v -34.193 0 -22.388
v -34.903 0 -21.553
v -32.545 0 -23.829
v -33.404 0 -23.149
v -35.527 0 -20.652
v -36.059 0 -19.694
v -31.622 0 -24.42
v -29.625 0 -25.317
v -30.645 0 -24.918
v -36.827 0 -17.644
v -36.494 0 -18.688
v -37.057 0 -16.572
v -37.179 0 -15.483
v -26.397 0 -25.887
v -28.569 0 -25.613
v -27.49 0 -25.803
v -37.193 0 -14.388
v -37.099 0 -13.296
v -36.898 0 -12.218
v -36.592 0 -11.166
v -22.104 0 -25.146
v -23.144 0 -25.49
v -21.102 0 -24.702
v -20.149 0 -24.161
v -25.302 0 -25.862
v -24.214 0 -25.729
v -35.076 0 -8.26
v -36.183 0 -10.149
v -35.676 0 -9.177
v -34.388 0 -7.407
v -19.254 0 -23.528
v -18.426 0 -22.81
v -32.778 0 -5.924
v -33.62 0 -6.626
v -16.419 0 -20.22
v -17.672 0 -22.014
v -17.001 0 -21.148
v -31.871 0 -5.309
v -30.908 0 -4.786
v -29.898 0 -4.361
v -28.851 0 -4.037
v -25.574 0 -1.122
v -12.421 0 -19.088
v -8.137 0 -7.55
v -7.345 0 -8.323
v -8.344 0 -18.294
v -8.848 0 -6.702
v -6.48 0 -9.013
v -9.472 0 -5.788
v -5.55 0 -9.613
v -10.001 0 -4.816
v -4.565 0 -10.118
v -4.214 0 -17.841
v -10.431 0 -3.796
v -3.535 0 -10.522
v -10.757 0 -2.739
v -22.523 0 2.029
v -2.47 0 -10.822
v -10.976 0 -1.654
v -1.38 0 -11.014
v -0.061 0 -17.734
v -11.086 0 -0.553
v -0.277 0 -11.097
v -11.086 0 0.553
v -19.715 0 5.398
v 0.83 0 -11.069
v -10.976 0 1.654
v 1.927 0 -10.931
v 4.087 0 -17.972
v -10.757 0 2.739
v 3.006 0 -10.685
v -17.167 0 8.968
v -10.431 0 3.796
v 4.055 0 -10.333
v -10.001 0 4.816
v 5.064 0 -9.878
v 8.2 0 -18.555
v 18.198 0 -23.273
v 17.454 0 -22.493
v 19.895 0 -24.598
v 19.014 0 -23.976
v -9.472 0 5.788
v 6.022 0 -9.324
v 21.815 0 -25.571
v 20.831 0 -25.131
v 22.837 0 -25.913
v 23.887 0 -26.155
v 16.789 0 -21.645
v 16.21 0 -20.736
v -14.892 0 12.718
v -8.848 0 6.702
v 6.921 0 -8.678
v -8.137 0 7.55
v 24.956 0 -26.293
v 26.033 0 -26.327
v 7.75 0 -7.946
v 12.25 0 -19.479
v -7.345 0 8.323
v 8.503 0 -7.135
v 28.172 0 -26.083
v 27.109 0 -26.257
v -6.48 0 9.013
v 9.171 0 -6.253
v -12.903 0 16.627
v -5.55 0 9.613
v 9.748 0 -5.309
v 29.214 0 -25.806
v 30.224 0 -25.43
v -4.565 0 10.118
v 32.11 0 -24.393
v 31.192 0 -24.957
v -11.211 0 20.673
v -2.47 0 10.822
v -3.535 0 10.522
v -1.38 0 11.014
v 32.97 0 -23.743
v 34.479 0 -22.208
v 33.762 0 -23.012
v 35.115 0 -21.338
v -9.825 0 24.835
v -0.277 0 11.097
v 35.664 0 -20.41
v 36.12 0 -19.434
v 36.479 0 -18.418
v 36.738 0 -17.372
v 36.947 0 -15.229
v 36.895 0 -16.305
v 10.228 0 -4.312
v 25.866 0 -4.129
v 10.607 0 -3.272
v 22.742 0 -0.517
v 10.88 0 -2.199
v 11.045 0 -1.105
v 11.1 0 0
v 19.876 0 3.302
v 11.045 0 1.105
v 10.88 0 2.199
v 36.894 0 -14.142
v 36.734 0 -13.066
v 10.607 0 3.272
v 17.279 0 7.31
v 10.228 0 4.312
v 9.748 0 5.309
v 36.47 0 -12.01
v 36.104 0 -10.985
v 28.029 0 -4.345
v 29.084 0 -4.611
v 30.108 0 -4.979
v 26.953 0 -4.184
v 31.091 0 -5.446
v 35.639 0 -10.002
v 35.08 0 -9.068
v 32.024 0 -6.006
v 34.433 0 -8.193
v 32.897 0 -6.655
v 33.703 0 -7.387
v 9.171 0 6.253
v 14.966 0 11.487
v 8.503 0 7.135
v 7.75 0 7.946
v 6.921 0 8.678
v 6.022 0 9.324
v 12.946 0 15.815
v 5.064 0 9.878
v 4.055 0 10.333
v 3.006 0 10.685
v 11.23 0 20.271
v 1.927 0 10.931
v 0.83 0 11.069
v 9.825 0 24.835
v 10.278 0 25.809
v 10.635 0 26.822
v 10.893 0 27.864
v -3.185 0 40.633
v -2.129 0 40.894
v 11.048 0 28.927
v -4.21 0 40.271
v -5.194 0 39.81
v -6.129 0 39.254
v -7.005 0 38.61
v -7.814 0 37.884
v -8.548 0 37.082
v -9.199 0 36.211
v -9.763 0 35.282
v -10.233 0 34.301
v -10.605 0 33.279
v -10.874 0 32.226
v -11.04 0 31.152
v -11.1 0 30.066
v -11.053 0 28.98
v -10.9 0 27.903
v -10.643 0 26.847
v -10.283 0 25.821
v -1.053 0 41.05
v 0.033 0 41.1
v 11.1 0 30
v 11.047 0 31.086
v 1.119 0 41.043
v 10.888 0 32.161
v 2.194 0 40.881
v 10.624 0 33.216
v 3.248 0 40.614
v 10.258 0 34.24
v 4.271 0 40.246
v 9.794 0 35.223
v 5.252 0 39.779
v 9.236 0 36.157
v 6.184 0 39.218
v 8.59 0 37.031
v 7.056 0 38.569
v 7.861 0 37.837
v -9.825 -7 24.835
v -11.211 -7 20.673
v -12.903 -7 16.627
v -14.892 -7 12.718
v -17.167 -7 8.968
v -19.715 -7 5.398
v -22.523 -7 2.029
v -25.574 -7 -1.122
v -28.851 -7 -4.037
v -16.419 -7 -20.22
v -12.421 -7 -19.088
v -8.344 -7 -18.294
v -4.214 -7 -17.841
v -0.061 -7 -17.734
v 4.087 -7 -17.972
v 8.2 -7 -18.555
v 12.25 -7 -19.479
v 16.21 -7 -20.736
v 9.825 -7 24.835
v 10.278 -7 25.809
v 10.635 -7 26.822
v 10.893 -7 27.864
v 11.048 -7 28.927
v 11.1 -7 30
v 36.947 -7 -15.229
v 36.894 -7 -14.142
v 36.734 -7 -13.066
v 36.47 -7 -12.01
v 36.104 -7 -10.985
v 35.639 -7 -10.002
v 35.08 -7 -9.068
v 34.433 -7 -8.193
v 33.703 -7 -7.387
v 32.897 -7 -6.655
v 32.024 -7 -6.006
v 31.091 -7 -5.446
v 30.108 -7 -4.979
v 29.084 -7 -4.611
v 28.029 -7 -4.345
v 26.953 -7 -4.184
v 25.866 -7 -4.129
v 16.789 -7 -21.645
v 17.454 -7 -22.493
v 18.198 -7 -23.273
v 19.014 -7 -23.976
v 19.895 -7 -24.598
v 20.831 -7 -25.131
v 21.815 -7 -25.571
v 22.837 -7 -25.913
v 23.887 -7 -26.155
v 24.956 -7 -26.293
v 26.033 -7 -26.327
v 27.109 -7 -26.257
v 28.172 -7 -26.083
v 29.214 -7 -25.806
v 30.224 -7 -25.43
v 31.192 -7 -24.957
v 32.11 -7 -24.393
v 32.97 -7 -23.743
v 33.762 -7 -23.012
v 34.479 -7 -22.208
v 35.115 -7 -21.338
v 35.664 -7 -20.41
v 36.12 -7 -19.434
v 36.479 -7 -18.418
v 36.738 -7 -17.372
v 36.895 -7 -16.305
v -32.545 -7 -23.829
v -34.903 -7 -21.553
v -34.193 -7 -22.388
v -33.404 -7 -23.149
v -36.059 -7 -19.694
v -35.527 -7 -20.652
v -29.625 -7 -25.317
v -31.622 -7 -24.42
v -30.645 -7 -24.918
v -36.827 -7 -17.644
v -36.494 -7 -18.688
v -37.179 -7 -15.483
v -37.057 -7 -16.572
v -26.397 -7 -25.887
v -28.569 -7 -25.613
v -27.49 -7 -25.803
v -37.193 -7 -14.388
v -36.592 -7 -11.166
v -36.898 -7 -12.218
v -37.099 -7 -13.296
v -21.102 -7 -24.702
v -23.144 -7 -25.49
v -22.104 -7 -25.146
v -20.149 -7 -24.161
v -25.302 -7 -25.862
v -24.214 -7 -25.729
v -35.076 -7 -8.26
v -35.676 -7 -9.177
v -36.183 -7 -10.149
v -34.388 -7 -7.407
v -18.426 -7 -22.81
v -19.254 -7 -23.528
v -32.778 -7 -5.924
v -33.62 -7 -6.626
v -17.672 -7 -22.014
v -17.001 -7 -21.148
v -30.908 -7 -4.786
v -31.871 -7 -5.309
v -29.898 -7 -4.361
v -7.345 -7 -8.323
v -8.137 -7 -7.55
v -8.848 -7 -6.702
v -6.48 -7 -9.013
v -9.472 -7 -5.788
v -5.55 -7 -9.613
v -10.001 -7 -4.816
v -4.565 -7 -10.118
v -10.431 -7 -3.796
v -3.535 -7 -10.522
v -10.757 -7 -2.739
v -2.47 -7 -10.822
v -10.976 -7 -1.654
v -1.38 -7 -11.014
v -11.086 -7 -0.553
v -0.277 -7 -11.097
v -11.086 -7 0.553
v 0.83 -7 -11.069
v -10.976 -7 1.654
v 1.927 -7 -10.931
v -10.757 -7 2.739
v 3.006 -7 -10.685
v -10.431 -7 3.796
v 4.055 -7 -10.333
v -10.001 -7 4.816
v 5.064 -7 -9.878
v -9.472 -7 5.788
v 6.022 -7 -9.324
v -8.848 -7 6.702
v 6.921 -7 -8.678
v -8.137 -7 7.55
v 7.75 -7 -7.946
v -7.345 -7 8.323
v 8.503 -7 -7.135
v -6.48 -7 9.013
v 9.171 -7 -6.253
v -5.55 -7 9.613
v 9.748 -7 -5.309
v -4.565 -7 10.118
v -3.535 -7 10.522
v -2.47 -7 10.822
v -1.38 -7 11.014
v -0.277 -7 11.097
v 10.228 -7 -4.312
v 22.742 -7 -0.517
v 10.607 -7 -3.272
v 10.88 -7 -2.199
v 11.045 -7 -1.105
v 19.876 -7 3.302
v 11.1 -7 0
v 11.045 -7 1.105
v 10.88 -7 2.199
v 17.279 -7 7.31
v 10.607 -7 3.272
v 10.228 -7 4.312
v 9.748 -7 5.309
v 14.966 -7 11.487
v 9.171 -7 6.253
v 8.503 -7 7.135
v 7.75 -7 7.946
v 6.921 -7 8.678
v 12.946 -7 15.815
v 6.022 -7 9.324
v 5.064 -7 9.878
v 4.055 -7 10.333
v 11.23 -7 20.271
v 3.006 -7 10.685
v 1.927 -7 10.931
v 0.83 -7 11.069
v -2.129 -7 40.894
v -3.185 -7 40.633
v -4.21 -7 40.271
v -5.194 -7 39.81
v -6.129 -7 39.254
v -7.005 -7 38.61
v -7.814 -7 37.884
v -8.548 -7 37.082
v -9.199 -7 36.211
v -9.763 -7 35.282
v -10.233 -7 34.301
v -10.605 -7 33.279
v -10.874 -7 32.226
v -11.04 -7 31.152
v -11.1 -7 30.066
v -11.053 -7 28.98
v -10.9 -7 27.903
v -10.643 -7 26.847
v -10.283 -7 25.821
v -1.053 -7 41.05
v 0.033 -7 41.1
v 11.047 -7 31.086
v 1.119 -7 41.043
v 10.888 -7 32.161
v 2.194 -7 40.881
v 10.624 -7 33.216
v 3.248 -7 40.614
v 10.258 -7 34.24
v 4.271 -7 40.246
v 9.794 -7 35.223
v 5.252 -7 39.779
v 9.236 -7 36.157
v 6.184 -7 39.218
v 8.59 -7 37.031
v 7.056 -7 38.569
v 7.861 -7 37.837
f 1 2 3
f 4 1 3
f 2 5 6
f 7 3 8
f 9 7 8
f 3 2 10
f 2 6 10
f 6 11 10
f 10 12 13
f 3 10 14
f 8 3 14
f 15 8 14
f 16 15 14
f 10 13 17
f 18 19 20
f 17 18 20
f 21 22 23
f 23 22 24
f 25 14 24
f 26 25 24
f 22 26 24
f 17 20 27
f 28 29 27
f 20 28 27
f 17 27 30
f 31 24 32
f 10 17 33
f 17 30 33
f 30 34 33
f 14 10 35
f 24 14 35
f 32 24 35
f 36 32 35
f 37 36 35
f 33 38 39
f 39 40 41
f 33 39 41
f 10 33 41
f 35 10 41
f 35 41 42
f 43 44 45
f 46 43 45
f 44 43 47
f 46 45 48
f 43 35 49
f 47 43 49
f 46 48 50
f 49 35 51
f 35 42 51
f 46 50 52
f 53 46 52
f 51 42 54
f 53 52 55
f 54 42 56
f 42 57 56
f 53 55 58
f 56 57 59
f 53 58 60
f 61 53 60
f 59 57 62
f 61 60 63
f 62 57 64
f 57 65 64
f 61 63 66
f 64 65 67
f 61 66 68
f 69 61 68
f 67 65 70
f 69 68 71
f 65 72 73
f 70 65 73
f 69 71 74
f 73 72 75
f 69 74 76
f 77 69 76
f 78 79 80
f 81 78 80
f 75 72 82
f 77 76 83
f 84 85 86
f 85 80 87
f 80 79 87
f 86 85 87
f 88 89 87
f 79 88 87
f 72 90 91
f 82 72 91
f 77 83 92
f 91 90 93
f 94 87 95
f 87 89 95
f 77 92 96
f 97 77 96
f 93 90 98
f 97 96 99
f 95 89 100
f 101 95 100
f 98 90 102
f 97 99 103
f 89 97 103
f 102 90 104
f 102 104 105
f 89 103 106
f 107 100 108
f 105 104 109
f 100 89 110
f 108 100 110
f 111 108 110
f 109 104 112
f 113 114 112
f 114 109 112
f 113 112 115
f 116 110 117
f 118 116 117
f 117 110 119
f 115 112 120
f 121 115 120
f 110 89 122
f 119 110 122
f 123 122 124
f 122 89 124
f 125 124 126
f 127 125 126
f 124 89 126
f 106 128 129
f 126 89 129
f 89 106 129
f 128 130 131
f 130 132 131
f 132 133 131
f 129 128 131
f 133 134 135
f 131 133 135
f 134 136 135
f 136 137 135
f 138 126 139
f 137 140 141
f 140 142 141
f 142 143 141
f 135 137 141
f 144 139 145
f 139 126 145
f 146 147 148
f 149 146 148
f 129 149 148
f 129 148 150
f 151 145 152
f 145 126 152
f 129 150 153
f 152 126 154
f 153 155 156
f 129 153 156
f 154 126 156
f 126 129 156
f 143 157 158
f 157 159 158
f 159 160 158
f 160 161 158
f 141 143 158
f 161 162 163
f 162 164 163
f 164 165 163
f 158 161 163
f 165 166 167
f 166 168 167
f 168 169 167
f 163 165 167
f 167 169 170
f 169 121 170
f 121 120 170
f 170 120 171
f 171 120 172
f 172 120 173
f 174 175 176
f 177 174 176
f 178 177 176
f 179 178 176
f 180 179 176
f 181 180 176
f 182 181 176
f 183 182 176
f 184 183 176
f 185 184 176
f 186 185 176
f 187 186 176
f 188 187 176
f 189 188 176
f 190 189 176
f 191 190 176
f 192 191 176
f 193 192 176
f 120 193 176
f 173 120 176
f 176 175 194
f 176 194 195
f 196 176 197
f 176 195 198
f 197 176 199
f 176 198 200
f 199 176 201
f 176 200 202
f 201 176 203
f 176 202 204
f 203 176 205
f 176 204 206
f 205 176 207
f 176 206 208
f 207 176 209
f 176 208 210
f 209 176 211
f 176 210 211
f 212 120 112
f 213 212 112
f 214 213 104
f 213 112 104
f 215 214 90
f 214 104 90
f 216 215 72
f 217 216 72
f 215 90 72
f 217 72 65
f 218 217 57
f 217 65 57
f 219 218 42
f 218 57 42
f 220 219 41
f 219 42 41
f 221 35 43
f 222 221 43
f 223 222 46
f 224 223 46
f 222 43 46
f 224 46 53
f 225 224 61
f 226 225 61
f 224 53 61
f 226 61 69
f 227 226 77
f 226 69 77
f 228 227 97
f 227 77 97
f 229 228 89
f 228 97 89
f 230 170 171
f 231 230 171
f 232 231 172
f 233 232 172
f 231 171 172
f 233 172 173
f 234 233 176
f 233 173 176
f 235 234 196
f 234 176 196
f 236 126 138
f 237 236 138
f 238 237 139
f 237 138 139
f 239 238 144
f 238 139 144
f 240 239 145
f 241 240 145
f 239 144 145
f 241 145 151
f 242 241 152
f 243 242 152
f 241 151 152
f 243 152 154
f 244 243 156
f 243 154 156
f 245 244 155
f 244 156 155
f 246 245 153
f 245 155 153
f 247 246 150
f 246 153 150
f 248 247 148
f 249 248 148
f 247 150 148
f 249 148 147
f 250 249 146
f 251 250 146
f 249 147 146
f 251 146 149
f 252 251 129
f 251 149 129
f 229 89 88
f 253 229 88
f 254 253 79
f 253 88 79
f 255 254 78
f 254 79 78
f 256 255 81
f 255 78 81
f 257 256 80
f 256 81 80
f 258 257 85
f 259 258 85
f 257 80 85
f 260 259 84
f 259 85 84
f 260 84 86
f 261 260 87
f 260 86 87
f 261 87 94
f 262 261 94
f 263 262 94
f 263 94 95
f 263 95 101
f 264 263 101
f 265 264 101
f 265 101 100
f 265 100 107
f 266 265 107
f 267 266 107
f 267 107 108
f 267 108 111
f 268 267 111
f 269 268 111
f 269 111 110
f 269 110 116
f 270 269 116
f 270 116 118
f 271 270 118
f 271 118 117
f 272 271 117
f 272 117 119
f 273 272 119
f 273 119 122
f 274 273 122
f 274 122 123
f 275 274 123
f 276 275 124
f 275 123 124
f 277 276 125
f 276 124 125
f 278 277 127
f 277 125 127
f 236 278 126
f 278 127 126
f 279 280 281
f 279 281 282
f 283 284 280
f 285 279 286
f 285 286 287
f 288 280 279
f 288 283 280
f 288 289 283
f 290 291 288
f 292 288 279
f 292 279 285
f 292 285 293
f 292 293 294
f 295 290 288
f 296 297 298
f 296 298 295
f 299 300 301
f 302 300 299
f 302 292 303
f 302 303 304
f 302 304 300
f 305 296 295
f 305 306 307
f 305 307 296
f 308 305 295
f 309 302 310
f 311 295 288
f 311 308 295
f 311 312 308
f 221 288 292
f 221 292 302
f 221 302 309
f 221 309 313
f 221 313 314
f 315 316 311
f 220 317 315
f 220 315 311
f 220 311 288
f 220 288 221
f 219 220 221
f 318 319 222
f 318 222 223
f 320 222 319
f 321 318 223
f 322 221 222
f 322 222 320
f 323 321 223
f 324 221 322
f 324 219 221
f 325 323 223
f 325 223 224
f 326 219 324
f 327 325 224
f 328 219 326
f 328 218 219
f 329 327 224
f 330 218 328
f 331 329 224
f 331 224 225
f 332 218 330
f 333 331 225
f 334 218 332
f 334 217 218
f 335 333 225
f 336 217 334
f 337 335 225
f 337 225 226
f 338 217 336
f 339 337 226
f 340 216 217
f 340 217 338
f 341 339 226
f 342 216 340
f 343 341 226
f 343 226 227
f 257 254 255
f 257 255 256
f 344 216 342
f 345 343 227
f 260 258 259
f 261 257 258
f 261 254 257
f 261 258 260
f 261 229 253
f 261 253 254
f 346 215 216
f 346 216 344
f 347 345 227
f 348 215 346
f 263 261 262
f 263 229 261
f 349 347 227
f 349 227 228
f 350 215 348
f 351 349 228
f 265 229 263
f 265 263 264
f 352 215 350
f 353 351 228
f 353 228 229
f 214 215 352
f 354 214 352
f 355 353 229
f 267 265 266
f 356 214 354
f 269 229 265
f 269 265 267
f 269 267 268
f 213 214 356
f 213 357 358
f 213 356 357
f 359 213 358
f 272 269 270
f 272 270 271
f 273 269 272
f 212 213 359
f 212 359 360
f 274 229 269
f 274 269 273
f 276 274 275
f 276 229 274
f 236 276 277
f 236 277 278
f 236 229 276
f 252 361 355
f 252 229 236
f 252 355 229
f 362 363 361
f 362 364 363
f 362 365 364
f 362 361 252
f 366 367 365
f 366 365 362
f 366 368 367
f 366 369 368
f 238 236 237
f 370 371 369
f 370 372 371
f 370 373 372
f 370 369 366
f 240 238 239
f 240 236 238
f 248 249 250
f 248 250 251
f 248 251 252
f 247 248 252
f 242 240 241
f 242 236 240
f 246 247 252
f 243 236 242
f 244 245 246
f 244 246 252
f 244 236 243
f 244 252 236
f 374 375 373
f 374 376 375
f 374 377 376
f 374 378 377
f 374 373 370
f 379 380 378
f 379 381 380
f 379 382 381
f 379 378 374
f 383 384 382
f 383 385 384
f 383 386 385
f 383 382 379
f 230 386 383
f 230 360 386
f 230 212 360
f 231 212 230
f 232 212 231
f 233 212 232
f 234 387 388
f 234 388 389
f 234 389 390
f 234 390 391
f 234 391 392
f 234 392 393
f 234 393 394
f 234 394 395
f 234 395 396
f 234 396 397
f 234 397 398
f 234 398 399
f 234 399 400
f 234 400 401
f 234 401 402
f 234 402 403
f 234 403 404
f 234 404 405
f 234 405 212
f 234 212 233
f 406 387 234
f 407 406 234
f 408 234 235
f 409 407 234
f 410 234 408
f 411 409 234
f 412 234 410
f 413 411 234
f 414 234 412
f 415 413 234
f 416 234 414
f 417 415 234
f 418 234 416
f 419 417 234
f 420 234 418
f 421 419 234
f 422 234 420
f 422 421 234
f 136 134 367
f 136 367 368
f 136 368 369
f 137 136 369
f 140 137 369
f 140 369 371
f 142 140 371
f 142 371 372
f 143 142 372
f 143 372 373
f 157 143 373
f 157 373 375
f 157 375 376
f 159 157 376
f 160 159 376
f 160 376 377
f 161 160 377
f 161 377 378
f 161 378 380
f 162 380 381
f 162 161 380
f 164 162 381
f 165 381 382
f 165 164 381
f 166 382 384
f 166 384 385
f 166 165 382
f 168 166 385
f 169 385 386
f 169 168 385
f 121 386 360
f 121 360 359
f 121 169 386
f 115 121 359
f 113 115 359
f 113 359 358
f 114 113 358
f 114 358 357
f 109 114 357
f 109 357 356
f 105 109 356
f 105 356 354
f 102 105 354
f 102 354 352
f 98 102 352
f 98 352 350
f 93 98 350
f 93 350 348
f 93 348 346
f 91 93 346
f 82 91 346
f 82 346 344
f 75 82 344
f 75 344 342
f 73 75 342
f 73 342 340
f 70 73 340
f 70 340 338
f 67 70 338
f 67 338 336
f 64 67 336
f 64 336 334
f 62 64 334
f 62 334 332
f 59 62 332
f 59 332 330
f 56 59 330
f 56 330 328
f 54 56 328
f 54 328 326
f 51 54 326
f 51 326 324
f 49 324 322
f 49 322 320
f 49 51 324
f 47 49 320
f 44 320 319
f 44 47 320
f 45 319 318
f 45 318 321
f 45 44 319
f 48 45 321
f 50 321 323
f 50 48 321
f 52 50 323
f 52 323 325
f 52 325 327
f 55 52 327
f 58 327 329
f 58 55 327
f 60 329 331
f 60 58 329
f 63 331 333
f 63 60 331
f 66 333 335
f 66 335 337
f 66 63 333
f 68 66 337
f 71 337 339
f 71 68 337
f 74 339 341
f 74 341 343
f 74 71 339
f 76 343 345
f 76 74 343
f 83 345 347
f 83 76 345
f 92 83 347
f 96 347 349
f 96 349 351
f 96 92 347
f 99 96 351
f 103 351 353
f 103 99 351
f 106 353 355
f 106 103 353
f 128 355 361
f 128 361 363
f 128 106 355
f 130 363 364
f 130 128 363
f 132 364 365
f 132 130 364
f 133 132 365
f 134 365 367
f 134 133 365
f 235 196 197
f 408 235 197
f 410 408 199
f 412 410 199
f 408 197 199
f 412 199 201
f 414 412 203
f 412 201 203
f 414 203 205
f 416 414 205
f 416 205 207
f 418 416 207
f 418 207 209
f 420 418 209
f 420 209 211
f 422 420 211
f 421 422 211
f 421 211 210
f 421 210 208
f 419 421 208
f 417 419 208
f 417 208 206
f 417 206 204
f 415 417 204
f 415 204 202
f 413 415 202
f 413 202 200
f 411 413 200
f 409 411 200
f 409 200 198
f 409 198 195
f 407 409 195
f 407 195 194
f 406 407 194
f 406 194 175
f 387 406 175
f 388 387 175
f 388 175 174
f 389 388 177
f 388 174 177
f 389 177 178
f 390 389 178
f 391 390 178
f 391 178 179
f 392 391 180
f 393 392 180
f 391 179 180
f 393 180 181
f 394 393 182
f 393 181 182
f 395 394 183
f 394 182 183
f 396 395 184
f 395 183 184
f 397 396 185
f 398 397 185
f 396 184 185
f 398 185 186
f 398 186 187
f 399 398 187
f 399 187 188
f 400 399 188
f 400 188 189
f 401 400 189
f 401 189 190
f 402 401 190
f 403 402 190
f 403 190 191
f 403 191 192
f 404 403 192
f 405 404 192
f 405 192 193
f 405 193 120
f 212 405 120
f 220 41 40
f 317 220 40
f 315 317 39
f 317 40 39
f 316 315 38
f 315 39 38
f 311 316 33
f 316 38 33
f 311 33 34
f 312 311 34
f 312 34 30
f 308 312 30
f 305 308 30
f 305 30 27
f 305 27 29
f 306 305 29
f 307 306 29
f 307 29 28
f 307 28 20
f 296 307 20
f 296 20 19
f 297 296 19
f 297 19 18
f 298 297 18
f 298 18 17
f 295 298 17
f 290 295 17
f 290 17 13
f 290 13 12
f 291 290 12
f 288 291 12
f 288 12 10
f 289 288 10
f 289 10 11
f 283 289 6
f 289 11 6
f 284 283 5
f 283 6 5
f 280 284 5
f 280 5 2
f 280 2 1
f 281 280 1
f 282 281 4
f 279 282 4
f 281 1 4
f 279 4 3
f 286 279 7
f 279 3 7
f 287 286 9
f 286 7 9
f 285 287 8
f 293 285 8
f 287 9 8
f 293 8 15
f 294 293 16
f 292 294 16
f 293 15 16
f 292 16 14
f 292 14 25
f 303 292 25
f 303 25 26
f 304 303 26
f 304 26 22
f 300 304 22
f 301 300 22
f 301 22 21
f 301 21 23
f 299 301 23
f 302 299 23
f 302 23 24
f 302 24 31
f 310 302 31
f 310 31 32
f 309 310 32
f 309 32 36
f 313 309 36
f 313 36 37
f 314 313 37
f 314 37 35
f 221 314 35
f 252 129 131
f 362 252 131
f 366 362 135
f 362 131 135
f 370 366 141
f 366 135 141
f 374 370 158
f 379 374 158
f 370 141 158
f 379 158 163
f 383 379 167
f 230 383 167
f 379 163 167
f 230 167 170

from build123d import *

# Parameters (mm, degrees)
F0_R     = 11.1
F1_DEPTH = 7
F2_DEPTH = 7
F3_DEPTH = 5


with BuildPart() as f1:
    # F0 (on Front) → F1 (new body)
    with BuildSketch(Plane.XZ):
        with BuildLine():
            ThreePointArc((9.825039, 24.834865), (10.776547, 27.339918), (11.1, 30))
            ThreePointArc((11.1, 30), (-2.660082, 40.776547), (-9.825039, 24.834865))
            ThreePointArc((-9.825039, 24.834865), (0, 18.9), (9.825039, 24.834865))
        make_face()
        with BuildLine():
            ThreePointArc((9.825039, 24.834865), (0, 18.9), (-9.825039, 24.834865))
            ThreePointArc((-9.825039, 24.834865), (-17.166777, 8.96815), (-28.85096, -4.03699))
            ThreePointArc((-28.85096, -4.03699), (-19.293109, -6.023224), (-15.000423, -14.790805))
            ThreePointArc((-15.000423, -14.790805), (-15.360837, -17.596387), (-16.418674, -20.219776))
            ThreePointArc((-16.418674, -20.219776), (-0.060989, -17.733621), (16.209832, -20.736158))
            ThreePointArc((16.209832, -20.736158), (16.251405, -9.649504), (25.865907, -4.128908))
            ThreePointArc((25.865907, -4.128908), (16.086312, 9.378711), (9.825039, 24.834865))
        make_face()
        Circle(F0_R, mode=Mode.SUBTRACT)
        with BuildLine():
            ThreePointArc((-15.000423, -14.790805), (-19.293109, -6.023224), (-28.85096, -4.03699))
            ThreePointArc((-28.85096, -4.03699), (-34.902757, -21.553122), (-16.418674, -20.219776))
            ThreePointArc((-16.418674, -20.219776), (-15.360837, -17.596387), (-15.000423, -14.790805))
        make_face()
        with BuildLine():
            ThreePointArc((36.94726, -15.228892), (33.702735, -7.386602), (25.865907, -4.128908))
            ThreePointArc((25.865907, -4.128908), (16.251405, -9.649504), (16.209832, -20.736158))
            ThreePointArc((16.209832, -20.736158), (28.696343, -25.95702), (36.94726, -15.228892))
        make_face()
    extrude(amount=F1_DEPTH)

    # F0 (on Front) → F2 (join)
    with BuildSketch(Plane.XZ):
        with BuildLine():
            ThreePointArc((9.825039, 24.834865), (10.776547, 27.339918), (11.1, 30))
            ThreePointArc((11.1, 30), (-2.660082, 40.776547), (-9.825039, 24.834865))
            ThreePointArc((-9.825039, 24.834865), (0, 18.9), (9.825039, 24.834865))
        make_face()
        with BuildLine():
            ThreePointArc((9.825039, 24.834865), (0, 18.9), (-9.825039, 24.834865))
            ThreePointArc((-9.825039, 24.834865), (-17.166777, 8.96815), (-28.85096, -4.03699))
            ThreePointArc((-28.85096, -4.03699), (-19.293109, -6.023224), (-15.000423, -14.790805))
            ThreePointArc((-15.000423, -14.790805), (-15.360837, -17.596387), (-16.418674, -20.219776))
            ThreePointArc((-16.418674, -20.219776), (-0.060989, -17.733621), (16.209832, -20.736158))
            ThreePointArc((16.209832, -20.736158), (16.251405, -9.649504), (25.865907, -4.128908))
            ThreePointArc((25.865907, -4.128908), (16.086312, 9.378711), (9.825039, 24.834865))
        make_face()
        Circle(F0_R, mode=Mode.SUBTRACT)
        with BuildLine():
            ThreePointArc((-15.000423, -14.790805), (-19.293109, -6.023224), (-28.85096, -4.03699))
            ThreePointArc((-28.85096, -4.03699), (-34.902757, -21.553122), (-16.418674, -20.219776))
            ThreePointArc((-16.418674, -20.219776), (-15.360837, -17.596387), (-15.000423, -14.790805))
        make_face()
        with BuildLine():
            ThreePointArc((36.94726, -15.228892), (33.702735, -7.386602), (25.865907, -4.128908))
            ThreePointArc((25.865907, -4.128908), (16.251405, -9.649504), (16.209832, -20.736158))
            ThreePointArc((16.209832, -20.736158), (28.696343, -25.95702), (36.94726, -15.228892))
        make_face()
    extrude(amount=F2_DEPTH)

    # F0 (on Front) → F3 (join)
    with BuildSketch(Plane.XZ):
        with BuildLine():
            ThreePointArc((9.825039, 24.834865), (10.776547, 27.339918), (11.1, 30))
            ThreePointArc((11.1, 30), (-2.660082, 40.776547), (-9.825039, 24.834865))
            ThreePointArc((-9.825039, 24.834865), (0, 18.9), (9.825039, 24.834865))
        make_face()
        with BuildLine():
            ThreePointArc((9.825039, 24.834865), (0, 18.9), (-9.825039, 24.834865))
            ThreePointArc((-9.825039, 24.834865), (-17.166777, 8.96815), (-28.85096, -4.03699))
            ThreePointArc((-28.85096, -4.03699), (-19.293109, -6.023224), (-15.000423, -14.790805))
            ThreePointArc((-15.000423, -14.790805), (-15.360837, -17.596387), (-16.418674, -20.219776))
            ThreePointArc((-16.418674, -20.219776), (-0.060989, -17.733621), (16.209832, -20.736158))
            ThreePointArc((16.209832, -20.736158), (16.251405, -9.649504), (25.865907, -4.128908))
            ThreePointArc((25.865907, -4.128908), (16.086312, 9.378711), (9.825039, 24.834865))
        make_face()
        Circle(F0_R, mode=Mode.SUBTRACT)
        with BuildLine():
            ThreePointArc((-15.000423, -14.790805), (-19.293109, -6.023224), (-28.85096, -4.03699))
            ThreePointArc((-28.85096, -4.03699), (-34.902757, -21.553122), (-16.418674, -20.219776))
            ThreePointArc((-16.418674, -20.219776), (-15.360837, -17.596387), (-15.000423, -14.790805))
        make_face()
        with BuildLine():
            ThreePointArc((36.94726, -15.228892), (33.702735, -7.386602), (25.865907, -4.128908))
            ThreePointArc((25.865907, -4.128908), (16.251405, -9.649504), (16.209832, -20.736158))
            ThreePointArc((16.209832, -20.736158), (28.696343, -25.95702), (36.94726, -15.228892))
        make_face()
    extrude(amount=F3_DEPTH)


solid = f1.part
